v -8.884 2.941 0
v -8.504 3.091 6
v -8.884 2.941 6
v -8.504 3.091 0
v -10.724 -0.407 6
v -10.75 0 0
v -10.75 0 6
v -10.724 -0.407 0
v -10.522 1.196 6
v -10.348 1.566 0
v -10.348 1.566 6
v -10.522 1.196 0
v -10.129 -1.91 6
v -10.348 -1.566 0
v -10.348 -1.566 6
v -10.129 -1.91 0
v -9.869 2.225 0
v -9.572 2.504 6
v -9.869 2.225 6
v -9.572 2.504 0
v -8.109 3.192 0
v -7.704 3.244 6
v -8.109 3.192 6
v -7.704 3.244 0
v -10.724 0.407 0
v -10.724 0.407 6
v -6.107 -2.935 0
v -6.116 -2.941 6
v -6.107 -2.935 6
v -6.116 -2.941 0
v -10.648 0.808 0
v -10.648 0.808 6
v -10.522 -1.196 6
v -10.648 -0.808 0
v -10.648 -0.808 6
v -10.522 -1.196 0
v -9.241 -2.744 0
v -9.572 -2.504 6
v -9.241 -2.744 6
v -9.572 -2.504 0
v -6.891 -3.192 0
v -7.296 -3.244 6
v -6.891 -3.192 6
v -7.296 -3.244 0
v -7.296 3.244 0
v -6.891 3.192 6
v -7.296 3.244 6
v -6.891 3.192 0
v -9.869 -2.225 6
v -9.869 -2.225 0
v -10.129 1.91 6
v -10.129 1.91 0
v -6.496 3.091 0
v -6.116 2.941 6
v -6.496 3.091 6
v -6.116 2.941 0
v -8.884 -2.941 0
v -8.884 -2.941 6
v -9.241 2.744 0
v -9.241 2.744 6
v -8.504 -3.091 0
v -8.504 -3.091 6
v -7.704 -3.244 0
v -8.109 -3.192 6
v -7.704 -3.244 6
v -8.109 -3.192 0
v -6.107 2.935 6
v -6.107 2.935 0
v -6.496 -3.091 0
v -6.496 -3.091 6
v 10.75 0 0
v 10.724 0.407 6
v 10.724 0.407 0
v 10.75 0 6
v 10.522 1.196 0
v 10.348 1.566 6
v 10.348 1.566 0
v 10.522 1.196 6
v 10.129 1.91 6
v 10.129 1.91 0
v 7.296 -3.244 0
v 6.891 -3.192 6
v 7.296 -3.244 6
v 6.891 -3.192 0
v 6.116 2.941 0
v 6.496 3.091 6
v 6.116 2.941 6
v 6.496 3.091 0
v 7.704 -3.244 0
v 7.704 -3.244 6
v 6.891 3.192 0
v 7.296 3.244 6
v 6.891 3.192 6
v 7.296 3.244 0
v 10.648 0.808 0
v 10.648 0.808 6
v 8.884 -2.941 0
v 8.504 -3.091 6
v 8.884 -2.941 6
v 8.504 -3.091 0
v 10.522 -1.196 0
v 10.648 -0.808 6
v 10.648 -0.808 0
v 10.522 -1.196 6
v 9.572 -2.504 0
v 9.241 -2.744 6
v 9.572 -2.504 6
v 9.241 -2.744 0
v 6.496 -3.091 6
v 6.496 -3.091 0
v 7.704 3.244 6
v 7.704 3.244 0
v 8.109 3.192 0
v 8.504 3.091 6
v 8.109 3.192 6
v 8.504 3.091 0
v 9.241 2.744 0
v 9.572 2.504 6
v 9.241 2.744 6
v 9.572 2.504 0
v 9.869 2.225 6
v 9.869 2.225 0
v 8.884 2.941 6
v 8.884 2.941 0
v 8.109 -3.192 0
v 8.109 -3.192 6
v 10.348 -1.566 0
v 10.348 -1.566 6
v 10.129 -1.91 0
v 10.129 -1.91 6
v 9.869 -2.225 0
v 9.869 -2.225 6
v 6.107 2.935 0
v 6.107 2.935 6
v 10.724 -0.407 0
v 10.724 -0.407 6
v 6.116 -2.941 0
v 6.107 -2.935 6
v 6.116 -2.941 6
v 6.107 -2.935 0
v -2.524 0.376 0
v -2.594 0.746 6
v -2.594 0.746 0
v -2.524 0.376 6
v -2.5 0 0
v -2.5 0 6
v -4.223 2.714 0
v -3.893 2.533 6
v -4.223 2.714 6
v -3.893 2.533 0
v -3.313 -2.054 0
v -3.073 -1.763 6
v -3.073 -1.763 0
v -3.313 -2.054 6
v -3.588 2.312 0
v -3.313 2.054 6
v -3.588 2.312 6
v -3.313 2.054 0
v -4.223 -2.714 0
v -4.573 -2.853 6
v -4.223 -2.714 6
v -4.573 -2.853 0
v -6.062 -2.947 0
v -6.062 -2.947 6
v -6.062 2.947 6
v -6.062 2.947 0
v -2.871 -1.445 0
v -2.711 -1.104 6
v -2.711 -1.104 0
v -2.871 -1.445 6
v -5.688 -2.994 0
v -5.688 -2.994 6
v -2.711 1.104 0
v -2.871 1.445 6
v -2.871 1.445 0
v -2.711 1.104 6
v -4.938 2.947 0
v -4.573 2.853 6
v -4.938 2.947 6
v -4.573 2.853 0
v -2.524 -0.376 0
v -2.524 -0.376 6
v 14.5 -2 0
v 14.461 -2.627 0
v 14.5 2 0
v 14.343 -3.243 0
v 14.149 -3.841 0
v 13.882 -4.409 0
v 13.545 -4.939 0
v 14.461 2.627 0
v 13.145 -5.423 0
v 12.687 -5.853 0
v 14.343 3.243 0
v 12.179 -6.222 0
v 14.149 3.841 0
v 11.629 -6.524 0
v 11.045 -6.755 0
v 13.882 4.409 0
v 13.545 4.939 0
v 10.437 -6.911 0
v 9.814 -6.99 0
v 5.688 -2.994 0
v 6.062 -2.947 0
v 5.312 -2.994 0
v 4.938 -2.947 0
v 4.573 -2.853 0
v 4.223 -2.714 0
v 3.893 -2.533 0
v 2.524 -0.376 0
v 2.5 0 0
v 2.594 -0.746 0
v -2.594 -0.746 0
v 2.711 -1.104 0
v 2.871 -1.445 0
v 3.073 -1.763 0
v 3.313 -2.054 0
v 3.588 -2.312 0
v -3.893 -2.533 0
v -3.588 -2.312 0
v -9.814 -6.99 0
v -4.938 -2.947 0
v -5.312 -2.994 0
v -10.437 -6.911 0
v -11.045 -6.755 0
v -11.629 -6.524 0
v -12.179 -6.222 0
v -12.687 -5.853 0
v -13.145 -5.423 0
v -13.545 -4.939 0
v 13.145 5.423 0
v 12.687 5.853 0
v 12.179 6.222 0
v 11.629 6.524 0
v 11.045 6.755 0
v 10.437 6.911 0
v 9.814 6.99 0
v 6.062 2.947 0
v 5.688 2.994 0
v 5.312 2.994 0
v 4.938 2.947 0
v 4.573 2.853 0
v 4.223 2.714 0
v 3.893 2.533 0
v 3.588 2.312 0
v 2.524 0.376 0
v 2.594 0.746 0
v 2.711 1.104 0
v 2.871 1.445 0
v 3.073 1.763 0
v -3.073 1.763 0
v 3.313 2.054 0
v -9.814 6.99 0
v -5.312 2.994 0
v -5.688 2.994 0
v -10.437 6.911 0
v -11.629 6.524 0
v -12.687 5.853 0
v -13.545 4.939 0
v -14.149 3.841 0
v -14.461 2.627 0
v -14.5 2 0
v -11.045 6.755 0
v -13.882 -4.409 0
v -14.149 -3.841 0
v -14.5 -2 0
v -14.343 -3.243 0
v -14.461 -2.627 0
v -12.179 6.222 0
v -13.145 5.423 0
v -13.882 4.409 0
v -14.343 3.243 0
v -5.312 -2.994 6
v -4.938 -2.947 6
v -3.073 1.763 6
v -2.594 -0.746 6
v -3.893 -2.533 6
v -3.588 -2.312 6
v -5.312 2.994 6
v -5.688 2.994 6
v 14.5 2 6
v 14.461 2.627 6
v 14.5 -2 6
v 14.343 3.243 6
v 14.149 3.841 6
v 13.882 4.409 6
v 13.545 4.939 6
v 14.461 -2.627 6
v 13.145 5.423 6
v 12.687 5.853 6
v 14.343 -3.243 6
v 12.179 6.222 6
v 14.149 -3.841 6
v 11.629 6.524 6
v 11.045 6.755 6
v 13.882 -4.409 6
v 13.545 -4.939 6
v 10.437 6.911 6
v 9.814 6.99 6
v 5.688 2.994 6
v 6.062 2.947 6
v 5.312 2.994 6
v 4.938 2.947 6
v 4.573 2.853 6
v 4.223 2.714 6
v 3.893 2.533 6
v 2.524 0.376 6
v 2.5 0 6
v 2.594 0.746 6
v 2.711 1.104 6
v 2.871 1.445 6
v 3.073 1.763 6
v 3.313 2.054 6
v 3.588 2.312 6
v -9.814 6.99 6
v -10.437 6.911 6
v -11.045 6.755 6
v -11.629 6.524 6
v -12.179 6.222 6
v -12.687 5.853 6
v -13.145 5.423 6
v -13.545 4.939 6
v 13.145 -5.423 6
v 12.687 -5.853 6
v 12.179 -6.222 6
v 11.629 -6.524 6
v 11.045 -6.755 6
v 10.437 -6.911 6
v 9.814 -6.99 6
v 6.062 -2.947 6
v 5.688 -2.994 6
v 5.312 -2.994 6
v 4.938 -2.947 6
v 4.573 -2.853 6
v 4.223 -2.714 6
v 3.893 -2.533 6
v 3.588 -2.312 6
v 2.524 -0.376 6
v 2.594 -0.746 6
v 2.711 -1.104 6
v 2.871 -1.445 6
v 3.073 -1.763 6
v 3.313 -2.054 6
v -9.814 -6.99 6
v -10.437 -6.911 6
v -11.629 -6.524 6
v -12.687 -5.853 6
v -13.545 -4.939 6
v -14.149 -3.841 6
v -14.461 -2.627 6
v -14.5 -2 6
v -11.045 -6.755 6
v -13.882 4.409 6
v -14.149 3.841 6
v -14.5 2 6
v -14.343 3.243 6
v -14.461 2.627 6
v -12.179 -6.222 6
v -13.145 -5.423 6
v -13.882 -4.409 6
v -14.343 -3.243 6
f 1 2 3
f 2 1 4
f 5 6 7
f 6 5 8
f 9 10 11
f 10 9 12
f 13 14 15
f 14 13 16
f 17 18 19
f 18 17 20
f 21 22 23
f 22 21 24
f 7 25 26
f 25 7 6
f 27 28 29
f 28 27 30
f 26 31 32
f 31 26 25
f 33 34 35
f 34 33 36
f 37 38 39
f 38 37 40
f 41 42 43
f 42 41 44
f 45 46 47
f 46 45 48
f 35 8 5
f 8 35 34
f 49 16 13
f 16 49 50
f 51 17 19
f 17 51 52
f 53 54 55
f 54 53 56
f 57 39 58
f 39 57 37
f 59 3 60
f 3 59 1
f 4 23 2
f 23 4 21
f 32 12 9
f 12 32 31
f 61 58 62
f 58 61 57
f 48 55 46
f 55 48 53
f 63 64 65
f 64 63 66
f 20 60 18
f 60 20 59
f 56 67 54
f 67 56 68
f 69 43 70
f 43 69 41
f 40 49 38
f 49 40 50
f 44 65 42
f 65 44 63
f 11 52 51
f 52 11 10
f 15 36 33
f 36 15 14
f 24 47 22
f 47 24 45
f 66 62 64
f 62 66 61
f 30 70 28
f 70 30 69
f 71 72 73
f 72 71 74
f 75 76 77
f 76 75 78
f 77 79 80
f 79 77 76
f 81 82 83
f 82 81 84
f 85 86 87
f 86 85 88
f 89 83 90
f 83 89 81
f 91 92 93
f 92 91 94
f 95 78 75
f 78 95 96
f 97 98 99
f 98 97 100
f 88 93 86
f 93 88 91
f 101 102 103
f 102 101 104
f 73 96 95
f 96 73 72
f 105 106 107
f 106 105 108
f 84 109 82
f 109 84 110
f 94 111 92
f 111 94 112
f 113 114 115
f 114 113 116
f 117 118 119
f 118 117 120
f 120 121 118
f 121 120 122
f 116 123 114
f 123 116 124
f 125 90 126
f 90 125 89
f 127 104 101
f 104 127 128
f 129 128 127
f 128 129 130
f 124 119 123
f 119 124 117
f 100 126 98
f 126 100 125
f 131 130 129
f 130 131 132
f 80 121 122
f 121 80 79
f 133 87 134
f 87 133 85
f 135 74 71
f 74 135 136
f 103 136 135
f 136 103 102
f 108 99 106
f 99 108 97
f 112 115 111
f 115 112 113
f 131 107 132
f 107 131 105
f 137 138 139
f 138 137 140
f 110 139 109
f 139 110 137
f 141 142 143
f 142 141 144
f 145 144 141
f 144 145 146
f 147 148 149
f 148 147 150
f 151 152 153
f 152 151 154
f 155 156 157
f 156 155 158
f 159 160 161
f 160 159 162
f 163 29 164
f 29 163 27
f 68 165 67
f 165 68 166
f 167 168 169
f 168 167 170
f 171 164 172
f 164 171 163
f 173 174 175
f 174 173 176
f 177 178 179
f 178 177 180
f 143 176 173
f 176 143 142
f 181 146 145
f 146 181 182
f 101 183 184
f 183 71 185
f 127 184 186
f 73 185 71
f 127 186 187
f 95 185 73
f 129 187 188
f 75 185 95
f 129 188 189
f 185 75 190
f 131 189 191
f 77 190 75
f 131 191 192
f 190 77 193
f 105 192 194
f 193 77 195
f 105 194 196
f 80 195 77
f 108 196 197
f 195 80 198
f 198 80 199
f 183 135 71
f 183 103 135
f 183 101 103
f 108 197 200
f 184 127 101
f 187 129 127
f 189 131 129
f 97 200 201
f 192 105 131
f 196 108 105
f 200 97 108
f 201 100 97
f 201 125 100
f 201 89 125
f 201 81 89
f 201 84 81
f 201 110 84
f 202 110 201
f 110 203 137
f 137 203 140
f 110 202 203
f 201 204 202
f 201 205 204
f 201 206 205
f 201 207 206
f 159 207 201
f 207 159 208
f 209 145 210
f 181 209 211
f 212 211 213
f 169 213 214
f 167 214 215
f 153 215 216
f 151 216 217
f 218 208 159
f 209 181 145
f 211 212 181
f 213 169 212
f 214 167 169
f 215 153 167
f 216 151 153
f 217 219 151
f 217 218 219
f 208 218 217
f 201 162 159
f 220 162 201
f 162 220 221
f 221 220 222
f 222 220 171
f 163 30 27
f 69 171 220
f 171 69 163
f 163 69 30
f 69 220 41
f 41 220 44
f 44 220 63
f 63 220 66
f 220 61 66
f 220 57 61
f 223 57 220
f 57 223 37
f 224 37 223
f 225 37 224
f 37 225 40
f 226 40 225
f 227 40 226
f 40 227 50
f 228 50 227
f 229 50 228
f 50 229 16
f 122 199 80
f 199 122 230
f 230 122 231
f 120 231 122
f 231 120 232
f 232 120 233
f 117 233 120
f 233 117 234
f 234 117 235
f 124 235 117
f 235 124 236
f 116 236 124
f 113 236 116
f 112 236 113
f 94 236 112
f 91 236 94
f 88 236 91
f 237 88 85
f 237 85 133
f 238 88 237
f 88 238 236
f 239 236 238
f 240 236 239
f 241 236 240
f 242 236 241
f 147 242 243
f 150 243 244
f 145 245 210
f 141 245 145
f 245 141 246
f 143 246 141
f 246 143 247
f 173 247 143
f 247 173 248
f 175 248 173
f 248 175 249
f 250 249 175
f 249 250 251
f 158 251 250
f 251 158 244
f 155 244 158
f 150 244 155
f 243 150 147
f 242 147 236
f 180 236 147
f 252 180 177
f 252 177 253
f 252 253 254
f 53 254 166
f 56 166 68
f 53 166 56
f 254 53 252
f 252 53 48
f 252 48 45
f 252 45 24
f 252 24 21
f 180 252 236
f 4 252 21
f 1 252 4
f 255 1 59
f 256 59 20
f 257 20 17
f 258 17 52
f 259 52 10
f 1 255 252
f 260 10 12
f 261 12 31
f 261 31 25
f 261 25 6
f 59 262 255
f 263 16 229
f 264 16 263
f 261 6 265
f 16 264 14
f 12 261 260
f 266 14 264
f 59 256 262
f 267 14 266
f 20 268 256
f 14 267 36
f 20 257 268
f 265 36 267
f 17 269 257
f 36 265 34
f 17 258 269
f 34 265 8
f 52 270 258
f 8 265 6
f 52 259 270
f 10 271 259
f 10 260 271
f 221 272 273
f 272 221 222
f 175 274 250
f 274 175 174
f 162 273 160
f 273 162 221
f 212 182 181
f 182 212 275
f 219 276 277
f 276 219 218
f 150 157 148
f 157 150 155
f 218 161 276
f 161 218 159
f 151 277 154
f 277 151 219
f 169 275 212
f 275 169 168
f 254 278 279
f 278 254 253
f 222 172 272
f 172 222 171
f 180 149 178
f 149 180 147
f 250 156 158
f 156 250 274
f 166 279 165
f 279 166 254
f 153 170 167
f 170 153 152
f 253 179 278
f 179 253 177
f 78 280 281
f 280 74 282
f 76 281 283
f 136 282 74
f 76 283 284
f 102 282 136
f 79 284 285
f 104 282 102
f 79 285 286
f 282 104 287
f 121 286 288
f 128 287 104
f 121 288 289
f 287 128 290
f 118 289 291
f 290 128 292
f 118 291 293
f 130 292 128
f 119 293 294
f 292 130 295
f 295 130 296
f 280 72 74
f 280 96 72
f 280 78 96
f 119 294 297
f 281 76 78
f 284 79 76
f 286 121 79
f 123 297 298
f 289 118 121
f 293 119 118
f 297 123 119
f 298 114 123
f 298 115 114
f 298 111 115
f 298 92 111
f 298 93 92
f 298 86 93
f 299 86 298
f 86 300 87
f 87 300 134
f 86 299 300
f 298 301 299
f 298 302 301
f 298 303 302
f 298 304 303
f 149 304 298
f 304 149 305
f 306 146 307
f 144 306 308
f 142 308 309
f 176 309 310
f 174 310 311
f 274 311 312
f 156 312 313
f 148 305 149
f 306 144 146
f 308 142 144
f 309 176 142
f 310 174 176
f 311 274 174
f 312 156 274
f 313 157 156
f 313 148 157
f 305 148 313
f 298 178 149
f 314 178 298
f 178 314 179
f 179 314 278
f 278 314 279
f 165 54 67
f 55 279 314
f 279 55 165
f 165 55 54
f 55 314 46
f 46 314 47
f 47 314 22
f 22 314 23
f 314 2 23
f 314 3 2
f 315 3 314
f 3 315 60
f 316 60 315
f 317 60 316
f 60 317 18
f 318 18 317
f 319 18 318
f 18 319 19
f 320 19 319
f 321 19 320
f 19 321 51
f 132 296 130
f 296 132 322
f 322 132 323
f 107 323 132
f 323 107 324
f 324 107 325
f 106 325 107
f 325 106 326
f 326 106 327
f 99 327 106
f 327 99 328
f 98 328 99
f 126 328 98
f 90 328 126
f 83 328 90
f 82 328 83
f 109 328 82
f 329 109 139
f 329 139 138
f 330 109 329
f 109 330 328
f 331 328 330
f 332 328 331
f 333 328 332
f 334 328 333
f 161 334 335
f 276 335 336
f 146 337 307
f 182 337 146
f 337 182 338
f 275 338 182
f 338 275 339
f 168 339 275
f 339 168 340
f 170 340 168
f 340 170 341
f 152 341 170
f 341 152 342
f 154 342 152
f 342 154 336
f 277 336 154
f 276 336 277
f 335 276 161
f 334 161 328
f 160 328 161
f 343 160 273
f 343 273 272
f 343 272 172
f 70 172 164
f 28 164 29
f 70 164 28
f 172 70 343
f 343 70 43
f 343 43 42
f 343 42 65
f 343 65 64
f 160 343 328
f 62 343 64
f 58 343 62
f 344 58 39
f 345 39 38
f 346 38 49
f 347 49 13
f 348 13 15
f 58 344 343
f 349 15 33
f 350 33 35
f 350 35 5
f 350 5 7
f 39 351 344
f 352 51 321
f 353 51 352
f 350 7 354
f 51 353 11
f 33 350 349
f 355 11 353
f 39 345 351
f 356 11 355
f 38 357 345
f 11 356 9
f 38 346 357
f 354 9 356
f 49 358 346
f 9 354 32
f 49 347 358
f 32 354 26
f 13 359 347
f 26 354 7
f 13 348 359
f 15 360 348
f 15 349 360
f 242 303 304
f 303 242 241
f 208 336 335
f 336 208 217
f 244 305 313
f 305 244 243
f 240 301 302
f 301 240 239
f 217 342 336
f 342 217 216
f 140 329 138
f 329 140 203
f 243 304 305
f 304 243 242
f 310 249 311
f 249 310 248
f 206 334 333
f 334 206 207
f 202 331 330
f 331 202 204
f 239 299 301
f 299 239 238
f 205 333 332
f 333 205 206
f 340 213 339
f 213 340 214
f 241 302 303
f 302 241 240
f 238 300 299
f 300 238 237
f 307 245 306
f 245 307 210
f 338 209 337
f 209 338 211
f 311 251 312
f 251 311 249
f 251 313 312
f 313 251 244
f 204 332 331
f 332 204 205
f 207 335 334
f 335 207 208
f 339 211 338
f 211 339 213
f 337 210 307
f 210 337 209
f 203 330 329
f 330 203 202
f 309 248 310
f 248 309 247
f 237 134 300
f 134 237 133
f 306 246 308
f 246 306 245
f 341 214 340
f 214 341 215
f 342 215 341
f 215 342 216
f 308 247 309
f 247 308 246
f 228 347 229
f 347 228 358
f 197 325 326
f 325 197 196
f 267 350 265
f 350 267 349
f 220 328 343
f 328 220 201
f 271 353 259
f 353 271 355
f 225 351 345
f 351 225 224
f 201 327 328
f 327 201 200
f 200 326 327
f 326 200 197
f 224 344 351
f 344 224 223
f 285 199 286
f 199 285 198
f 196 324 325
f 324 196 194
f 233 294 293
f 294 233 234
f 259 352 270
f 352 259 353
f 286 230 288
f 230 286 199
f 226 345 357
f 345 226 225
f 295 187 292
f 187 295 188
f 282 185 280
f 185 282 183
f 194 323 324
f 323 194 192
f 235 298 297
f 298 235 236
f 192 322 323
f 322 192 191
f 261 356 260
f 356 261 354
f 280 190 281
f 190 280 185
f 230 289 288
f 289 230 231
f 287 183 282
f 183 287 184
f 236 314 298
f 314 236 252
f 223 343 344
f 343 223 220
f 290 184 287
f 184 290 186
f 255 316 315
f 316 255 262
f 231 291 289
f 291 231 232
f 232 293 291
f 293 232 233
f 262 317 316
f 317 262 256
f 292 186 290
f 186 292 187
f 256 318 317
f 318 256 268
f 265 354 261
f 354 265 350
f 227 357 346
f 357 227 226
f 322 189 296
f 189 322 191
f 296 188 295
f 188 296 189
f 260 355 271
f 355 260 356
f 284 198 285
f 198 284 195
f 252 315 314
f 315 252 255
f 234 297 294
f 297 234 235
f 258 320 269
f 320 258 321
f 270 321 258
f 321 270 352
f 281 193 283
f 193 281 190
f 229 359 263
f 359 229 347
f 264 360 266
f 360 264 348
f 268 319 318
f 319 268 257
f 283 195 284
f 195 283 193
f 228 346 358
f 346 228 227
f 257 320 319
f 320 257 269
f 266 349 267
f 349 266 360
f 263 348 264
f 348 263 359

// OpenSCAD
$fn = 50;

difference() {
	union() {
		hull() {
			translate(v = [-9.5, 2.0, 0]) {
				cylinder(h = 6, r = 5);
			}
			translate(v = [9.5, 2.0, 0]) {
				cylinder(h = 6, r = 5);
			}
			translate(v = [-9.5, -2.0, 0]) {
				cylinder(h = 6, r = 5);
			}
			translate(v = [9.5, -2.0, 0]) {
				cylinder(h = 6, r = 5);
			}
		}
	}
	union() {
		translate(v = [-7.5, 0.0, -100.0]) {
			cylinder(h = 200, r = 3.25);
		}
		translate(v = [7.5, 0.0, -100.0]) {
			cylinder(h = 200, r = 3.25);
		}
		translate(v = [-7.5, 0.0, -100.0]) {
			cylinder(h = 200, r = 1.8);
		}
		translate(v = [7.5, 0.0, -100.0]) {
			cylinder(h = 200, r = 1.8);
		}
		translate(v = [-5.5, 0, 0.0]) {
			cylinder(h = 6, r = 3.0);
		}
		translate(v = [5.5, 0, 0.0]) {
			cylinder(h = 6, r = 3.0);
		}
	}
}
